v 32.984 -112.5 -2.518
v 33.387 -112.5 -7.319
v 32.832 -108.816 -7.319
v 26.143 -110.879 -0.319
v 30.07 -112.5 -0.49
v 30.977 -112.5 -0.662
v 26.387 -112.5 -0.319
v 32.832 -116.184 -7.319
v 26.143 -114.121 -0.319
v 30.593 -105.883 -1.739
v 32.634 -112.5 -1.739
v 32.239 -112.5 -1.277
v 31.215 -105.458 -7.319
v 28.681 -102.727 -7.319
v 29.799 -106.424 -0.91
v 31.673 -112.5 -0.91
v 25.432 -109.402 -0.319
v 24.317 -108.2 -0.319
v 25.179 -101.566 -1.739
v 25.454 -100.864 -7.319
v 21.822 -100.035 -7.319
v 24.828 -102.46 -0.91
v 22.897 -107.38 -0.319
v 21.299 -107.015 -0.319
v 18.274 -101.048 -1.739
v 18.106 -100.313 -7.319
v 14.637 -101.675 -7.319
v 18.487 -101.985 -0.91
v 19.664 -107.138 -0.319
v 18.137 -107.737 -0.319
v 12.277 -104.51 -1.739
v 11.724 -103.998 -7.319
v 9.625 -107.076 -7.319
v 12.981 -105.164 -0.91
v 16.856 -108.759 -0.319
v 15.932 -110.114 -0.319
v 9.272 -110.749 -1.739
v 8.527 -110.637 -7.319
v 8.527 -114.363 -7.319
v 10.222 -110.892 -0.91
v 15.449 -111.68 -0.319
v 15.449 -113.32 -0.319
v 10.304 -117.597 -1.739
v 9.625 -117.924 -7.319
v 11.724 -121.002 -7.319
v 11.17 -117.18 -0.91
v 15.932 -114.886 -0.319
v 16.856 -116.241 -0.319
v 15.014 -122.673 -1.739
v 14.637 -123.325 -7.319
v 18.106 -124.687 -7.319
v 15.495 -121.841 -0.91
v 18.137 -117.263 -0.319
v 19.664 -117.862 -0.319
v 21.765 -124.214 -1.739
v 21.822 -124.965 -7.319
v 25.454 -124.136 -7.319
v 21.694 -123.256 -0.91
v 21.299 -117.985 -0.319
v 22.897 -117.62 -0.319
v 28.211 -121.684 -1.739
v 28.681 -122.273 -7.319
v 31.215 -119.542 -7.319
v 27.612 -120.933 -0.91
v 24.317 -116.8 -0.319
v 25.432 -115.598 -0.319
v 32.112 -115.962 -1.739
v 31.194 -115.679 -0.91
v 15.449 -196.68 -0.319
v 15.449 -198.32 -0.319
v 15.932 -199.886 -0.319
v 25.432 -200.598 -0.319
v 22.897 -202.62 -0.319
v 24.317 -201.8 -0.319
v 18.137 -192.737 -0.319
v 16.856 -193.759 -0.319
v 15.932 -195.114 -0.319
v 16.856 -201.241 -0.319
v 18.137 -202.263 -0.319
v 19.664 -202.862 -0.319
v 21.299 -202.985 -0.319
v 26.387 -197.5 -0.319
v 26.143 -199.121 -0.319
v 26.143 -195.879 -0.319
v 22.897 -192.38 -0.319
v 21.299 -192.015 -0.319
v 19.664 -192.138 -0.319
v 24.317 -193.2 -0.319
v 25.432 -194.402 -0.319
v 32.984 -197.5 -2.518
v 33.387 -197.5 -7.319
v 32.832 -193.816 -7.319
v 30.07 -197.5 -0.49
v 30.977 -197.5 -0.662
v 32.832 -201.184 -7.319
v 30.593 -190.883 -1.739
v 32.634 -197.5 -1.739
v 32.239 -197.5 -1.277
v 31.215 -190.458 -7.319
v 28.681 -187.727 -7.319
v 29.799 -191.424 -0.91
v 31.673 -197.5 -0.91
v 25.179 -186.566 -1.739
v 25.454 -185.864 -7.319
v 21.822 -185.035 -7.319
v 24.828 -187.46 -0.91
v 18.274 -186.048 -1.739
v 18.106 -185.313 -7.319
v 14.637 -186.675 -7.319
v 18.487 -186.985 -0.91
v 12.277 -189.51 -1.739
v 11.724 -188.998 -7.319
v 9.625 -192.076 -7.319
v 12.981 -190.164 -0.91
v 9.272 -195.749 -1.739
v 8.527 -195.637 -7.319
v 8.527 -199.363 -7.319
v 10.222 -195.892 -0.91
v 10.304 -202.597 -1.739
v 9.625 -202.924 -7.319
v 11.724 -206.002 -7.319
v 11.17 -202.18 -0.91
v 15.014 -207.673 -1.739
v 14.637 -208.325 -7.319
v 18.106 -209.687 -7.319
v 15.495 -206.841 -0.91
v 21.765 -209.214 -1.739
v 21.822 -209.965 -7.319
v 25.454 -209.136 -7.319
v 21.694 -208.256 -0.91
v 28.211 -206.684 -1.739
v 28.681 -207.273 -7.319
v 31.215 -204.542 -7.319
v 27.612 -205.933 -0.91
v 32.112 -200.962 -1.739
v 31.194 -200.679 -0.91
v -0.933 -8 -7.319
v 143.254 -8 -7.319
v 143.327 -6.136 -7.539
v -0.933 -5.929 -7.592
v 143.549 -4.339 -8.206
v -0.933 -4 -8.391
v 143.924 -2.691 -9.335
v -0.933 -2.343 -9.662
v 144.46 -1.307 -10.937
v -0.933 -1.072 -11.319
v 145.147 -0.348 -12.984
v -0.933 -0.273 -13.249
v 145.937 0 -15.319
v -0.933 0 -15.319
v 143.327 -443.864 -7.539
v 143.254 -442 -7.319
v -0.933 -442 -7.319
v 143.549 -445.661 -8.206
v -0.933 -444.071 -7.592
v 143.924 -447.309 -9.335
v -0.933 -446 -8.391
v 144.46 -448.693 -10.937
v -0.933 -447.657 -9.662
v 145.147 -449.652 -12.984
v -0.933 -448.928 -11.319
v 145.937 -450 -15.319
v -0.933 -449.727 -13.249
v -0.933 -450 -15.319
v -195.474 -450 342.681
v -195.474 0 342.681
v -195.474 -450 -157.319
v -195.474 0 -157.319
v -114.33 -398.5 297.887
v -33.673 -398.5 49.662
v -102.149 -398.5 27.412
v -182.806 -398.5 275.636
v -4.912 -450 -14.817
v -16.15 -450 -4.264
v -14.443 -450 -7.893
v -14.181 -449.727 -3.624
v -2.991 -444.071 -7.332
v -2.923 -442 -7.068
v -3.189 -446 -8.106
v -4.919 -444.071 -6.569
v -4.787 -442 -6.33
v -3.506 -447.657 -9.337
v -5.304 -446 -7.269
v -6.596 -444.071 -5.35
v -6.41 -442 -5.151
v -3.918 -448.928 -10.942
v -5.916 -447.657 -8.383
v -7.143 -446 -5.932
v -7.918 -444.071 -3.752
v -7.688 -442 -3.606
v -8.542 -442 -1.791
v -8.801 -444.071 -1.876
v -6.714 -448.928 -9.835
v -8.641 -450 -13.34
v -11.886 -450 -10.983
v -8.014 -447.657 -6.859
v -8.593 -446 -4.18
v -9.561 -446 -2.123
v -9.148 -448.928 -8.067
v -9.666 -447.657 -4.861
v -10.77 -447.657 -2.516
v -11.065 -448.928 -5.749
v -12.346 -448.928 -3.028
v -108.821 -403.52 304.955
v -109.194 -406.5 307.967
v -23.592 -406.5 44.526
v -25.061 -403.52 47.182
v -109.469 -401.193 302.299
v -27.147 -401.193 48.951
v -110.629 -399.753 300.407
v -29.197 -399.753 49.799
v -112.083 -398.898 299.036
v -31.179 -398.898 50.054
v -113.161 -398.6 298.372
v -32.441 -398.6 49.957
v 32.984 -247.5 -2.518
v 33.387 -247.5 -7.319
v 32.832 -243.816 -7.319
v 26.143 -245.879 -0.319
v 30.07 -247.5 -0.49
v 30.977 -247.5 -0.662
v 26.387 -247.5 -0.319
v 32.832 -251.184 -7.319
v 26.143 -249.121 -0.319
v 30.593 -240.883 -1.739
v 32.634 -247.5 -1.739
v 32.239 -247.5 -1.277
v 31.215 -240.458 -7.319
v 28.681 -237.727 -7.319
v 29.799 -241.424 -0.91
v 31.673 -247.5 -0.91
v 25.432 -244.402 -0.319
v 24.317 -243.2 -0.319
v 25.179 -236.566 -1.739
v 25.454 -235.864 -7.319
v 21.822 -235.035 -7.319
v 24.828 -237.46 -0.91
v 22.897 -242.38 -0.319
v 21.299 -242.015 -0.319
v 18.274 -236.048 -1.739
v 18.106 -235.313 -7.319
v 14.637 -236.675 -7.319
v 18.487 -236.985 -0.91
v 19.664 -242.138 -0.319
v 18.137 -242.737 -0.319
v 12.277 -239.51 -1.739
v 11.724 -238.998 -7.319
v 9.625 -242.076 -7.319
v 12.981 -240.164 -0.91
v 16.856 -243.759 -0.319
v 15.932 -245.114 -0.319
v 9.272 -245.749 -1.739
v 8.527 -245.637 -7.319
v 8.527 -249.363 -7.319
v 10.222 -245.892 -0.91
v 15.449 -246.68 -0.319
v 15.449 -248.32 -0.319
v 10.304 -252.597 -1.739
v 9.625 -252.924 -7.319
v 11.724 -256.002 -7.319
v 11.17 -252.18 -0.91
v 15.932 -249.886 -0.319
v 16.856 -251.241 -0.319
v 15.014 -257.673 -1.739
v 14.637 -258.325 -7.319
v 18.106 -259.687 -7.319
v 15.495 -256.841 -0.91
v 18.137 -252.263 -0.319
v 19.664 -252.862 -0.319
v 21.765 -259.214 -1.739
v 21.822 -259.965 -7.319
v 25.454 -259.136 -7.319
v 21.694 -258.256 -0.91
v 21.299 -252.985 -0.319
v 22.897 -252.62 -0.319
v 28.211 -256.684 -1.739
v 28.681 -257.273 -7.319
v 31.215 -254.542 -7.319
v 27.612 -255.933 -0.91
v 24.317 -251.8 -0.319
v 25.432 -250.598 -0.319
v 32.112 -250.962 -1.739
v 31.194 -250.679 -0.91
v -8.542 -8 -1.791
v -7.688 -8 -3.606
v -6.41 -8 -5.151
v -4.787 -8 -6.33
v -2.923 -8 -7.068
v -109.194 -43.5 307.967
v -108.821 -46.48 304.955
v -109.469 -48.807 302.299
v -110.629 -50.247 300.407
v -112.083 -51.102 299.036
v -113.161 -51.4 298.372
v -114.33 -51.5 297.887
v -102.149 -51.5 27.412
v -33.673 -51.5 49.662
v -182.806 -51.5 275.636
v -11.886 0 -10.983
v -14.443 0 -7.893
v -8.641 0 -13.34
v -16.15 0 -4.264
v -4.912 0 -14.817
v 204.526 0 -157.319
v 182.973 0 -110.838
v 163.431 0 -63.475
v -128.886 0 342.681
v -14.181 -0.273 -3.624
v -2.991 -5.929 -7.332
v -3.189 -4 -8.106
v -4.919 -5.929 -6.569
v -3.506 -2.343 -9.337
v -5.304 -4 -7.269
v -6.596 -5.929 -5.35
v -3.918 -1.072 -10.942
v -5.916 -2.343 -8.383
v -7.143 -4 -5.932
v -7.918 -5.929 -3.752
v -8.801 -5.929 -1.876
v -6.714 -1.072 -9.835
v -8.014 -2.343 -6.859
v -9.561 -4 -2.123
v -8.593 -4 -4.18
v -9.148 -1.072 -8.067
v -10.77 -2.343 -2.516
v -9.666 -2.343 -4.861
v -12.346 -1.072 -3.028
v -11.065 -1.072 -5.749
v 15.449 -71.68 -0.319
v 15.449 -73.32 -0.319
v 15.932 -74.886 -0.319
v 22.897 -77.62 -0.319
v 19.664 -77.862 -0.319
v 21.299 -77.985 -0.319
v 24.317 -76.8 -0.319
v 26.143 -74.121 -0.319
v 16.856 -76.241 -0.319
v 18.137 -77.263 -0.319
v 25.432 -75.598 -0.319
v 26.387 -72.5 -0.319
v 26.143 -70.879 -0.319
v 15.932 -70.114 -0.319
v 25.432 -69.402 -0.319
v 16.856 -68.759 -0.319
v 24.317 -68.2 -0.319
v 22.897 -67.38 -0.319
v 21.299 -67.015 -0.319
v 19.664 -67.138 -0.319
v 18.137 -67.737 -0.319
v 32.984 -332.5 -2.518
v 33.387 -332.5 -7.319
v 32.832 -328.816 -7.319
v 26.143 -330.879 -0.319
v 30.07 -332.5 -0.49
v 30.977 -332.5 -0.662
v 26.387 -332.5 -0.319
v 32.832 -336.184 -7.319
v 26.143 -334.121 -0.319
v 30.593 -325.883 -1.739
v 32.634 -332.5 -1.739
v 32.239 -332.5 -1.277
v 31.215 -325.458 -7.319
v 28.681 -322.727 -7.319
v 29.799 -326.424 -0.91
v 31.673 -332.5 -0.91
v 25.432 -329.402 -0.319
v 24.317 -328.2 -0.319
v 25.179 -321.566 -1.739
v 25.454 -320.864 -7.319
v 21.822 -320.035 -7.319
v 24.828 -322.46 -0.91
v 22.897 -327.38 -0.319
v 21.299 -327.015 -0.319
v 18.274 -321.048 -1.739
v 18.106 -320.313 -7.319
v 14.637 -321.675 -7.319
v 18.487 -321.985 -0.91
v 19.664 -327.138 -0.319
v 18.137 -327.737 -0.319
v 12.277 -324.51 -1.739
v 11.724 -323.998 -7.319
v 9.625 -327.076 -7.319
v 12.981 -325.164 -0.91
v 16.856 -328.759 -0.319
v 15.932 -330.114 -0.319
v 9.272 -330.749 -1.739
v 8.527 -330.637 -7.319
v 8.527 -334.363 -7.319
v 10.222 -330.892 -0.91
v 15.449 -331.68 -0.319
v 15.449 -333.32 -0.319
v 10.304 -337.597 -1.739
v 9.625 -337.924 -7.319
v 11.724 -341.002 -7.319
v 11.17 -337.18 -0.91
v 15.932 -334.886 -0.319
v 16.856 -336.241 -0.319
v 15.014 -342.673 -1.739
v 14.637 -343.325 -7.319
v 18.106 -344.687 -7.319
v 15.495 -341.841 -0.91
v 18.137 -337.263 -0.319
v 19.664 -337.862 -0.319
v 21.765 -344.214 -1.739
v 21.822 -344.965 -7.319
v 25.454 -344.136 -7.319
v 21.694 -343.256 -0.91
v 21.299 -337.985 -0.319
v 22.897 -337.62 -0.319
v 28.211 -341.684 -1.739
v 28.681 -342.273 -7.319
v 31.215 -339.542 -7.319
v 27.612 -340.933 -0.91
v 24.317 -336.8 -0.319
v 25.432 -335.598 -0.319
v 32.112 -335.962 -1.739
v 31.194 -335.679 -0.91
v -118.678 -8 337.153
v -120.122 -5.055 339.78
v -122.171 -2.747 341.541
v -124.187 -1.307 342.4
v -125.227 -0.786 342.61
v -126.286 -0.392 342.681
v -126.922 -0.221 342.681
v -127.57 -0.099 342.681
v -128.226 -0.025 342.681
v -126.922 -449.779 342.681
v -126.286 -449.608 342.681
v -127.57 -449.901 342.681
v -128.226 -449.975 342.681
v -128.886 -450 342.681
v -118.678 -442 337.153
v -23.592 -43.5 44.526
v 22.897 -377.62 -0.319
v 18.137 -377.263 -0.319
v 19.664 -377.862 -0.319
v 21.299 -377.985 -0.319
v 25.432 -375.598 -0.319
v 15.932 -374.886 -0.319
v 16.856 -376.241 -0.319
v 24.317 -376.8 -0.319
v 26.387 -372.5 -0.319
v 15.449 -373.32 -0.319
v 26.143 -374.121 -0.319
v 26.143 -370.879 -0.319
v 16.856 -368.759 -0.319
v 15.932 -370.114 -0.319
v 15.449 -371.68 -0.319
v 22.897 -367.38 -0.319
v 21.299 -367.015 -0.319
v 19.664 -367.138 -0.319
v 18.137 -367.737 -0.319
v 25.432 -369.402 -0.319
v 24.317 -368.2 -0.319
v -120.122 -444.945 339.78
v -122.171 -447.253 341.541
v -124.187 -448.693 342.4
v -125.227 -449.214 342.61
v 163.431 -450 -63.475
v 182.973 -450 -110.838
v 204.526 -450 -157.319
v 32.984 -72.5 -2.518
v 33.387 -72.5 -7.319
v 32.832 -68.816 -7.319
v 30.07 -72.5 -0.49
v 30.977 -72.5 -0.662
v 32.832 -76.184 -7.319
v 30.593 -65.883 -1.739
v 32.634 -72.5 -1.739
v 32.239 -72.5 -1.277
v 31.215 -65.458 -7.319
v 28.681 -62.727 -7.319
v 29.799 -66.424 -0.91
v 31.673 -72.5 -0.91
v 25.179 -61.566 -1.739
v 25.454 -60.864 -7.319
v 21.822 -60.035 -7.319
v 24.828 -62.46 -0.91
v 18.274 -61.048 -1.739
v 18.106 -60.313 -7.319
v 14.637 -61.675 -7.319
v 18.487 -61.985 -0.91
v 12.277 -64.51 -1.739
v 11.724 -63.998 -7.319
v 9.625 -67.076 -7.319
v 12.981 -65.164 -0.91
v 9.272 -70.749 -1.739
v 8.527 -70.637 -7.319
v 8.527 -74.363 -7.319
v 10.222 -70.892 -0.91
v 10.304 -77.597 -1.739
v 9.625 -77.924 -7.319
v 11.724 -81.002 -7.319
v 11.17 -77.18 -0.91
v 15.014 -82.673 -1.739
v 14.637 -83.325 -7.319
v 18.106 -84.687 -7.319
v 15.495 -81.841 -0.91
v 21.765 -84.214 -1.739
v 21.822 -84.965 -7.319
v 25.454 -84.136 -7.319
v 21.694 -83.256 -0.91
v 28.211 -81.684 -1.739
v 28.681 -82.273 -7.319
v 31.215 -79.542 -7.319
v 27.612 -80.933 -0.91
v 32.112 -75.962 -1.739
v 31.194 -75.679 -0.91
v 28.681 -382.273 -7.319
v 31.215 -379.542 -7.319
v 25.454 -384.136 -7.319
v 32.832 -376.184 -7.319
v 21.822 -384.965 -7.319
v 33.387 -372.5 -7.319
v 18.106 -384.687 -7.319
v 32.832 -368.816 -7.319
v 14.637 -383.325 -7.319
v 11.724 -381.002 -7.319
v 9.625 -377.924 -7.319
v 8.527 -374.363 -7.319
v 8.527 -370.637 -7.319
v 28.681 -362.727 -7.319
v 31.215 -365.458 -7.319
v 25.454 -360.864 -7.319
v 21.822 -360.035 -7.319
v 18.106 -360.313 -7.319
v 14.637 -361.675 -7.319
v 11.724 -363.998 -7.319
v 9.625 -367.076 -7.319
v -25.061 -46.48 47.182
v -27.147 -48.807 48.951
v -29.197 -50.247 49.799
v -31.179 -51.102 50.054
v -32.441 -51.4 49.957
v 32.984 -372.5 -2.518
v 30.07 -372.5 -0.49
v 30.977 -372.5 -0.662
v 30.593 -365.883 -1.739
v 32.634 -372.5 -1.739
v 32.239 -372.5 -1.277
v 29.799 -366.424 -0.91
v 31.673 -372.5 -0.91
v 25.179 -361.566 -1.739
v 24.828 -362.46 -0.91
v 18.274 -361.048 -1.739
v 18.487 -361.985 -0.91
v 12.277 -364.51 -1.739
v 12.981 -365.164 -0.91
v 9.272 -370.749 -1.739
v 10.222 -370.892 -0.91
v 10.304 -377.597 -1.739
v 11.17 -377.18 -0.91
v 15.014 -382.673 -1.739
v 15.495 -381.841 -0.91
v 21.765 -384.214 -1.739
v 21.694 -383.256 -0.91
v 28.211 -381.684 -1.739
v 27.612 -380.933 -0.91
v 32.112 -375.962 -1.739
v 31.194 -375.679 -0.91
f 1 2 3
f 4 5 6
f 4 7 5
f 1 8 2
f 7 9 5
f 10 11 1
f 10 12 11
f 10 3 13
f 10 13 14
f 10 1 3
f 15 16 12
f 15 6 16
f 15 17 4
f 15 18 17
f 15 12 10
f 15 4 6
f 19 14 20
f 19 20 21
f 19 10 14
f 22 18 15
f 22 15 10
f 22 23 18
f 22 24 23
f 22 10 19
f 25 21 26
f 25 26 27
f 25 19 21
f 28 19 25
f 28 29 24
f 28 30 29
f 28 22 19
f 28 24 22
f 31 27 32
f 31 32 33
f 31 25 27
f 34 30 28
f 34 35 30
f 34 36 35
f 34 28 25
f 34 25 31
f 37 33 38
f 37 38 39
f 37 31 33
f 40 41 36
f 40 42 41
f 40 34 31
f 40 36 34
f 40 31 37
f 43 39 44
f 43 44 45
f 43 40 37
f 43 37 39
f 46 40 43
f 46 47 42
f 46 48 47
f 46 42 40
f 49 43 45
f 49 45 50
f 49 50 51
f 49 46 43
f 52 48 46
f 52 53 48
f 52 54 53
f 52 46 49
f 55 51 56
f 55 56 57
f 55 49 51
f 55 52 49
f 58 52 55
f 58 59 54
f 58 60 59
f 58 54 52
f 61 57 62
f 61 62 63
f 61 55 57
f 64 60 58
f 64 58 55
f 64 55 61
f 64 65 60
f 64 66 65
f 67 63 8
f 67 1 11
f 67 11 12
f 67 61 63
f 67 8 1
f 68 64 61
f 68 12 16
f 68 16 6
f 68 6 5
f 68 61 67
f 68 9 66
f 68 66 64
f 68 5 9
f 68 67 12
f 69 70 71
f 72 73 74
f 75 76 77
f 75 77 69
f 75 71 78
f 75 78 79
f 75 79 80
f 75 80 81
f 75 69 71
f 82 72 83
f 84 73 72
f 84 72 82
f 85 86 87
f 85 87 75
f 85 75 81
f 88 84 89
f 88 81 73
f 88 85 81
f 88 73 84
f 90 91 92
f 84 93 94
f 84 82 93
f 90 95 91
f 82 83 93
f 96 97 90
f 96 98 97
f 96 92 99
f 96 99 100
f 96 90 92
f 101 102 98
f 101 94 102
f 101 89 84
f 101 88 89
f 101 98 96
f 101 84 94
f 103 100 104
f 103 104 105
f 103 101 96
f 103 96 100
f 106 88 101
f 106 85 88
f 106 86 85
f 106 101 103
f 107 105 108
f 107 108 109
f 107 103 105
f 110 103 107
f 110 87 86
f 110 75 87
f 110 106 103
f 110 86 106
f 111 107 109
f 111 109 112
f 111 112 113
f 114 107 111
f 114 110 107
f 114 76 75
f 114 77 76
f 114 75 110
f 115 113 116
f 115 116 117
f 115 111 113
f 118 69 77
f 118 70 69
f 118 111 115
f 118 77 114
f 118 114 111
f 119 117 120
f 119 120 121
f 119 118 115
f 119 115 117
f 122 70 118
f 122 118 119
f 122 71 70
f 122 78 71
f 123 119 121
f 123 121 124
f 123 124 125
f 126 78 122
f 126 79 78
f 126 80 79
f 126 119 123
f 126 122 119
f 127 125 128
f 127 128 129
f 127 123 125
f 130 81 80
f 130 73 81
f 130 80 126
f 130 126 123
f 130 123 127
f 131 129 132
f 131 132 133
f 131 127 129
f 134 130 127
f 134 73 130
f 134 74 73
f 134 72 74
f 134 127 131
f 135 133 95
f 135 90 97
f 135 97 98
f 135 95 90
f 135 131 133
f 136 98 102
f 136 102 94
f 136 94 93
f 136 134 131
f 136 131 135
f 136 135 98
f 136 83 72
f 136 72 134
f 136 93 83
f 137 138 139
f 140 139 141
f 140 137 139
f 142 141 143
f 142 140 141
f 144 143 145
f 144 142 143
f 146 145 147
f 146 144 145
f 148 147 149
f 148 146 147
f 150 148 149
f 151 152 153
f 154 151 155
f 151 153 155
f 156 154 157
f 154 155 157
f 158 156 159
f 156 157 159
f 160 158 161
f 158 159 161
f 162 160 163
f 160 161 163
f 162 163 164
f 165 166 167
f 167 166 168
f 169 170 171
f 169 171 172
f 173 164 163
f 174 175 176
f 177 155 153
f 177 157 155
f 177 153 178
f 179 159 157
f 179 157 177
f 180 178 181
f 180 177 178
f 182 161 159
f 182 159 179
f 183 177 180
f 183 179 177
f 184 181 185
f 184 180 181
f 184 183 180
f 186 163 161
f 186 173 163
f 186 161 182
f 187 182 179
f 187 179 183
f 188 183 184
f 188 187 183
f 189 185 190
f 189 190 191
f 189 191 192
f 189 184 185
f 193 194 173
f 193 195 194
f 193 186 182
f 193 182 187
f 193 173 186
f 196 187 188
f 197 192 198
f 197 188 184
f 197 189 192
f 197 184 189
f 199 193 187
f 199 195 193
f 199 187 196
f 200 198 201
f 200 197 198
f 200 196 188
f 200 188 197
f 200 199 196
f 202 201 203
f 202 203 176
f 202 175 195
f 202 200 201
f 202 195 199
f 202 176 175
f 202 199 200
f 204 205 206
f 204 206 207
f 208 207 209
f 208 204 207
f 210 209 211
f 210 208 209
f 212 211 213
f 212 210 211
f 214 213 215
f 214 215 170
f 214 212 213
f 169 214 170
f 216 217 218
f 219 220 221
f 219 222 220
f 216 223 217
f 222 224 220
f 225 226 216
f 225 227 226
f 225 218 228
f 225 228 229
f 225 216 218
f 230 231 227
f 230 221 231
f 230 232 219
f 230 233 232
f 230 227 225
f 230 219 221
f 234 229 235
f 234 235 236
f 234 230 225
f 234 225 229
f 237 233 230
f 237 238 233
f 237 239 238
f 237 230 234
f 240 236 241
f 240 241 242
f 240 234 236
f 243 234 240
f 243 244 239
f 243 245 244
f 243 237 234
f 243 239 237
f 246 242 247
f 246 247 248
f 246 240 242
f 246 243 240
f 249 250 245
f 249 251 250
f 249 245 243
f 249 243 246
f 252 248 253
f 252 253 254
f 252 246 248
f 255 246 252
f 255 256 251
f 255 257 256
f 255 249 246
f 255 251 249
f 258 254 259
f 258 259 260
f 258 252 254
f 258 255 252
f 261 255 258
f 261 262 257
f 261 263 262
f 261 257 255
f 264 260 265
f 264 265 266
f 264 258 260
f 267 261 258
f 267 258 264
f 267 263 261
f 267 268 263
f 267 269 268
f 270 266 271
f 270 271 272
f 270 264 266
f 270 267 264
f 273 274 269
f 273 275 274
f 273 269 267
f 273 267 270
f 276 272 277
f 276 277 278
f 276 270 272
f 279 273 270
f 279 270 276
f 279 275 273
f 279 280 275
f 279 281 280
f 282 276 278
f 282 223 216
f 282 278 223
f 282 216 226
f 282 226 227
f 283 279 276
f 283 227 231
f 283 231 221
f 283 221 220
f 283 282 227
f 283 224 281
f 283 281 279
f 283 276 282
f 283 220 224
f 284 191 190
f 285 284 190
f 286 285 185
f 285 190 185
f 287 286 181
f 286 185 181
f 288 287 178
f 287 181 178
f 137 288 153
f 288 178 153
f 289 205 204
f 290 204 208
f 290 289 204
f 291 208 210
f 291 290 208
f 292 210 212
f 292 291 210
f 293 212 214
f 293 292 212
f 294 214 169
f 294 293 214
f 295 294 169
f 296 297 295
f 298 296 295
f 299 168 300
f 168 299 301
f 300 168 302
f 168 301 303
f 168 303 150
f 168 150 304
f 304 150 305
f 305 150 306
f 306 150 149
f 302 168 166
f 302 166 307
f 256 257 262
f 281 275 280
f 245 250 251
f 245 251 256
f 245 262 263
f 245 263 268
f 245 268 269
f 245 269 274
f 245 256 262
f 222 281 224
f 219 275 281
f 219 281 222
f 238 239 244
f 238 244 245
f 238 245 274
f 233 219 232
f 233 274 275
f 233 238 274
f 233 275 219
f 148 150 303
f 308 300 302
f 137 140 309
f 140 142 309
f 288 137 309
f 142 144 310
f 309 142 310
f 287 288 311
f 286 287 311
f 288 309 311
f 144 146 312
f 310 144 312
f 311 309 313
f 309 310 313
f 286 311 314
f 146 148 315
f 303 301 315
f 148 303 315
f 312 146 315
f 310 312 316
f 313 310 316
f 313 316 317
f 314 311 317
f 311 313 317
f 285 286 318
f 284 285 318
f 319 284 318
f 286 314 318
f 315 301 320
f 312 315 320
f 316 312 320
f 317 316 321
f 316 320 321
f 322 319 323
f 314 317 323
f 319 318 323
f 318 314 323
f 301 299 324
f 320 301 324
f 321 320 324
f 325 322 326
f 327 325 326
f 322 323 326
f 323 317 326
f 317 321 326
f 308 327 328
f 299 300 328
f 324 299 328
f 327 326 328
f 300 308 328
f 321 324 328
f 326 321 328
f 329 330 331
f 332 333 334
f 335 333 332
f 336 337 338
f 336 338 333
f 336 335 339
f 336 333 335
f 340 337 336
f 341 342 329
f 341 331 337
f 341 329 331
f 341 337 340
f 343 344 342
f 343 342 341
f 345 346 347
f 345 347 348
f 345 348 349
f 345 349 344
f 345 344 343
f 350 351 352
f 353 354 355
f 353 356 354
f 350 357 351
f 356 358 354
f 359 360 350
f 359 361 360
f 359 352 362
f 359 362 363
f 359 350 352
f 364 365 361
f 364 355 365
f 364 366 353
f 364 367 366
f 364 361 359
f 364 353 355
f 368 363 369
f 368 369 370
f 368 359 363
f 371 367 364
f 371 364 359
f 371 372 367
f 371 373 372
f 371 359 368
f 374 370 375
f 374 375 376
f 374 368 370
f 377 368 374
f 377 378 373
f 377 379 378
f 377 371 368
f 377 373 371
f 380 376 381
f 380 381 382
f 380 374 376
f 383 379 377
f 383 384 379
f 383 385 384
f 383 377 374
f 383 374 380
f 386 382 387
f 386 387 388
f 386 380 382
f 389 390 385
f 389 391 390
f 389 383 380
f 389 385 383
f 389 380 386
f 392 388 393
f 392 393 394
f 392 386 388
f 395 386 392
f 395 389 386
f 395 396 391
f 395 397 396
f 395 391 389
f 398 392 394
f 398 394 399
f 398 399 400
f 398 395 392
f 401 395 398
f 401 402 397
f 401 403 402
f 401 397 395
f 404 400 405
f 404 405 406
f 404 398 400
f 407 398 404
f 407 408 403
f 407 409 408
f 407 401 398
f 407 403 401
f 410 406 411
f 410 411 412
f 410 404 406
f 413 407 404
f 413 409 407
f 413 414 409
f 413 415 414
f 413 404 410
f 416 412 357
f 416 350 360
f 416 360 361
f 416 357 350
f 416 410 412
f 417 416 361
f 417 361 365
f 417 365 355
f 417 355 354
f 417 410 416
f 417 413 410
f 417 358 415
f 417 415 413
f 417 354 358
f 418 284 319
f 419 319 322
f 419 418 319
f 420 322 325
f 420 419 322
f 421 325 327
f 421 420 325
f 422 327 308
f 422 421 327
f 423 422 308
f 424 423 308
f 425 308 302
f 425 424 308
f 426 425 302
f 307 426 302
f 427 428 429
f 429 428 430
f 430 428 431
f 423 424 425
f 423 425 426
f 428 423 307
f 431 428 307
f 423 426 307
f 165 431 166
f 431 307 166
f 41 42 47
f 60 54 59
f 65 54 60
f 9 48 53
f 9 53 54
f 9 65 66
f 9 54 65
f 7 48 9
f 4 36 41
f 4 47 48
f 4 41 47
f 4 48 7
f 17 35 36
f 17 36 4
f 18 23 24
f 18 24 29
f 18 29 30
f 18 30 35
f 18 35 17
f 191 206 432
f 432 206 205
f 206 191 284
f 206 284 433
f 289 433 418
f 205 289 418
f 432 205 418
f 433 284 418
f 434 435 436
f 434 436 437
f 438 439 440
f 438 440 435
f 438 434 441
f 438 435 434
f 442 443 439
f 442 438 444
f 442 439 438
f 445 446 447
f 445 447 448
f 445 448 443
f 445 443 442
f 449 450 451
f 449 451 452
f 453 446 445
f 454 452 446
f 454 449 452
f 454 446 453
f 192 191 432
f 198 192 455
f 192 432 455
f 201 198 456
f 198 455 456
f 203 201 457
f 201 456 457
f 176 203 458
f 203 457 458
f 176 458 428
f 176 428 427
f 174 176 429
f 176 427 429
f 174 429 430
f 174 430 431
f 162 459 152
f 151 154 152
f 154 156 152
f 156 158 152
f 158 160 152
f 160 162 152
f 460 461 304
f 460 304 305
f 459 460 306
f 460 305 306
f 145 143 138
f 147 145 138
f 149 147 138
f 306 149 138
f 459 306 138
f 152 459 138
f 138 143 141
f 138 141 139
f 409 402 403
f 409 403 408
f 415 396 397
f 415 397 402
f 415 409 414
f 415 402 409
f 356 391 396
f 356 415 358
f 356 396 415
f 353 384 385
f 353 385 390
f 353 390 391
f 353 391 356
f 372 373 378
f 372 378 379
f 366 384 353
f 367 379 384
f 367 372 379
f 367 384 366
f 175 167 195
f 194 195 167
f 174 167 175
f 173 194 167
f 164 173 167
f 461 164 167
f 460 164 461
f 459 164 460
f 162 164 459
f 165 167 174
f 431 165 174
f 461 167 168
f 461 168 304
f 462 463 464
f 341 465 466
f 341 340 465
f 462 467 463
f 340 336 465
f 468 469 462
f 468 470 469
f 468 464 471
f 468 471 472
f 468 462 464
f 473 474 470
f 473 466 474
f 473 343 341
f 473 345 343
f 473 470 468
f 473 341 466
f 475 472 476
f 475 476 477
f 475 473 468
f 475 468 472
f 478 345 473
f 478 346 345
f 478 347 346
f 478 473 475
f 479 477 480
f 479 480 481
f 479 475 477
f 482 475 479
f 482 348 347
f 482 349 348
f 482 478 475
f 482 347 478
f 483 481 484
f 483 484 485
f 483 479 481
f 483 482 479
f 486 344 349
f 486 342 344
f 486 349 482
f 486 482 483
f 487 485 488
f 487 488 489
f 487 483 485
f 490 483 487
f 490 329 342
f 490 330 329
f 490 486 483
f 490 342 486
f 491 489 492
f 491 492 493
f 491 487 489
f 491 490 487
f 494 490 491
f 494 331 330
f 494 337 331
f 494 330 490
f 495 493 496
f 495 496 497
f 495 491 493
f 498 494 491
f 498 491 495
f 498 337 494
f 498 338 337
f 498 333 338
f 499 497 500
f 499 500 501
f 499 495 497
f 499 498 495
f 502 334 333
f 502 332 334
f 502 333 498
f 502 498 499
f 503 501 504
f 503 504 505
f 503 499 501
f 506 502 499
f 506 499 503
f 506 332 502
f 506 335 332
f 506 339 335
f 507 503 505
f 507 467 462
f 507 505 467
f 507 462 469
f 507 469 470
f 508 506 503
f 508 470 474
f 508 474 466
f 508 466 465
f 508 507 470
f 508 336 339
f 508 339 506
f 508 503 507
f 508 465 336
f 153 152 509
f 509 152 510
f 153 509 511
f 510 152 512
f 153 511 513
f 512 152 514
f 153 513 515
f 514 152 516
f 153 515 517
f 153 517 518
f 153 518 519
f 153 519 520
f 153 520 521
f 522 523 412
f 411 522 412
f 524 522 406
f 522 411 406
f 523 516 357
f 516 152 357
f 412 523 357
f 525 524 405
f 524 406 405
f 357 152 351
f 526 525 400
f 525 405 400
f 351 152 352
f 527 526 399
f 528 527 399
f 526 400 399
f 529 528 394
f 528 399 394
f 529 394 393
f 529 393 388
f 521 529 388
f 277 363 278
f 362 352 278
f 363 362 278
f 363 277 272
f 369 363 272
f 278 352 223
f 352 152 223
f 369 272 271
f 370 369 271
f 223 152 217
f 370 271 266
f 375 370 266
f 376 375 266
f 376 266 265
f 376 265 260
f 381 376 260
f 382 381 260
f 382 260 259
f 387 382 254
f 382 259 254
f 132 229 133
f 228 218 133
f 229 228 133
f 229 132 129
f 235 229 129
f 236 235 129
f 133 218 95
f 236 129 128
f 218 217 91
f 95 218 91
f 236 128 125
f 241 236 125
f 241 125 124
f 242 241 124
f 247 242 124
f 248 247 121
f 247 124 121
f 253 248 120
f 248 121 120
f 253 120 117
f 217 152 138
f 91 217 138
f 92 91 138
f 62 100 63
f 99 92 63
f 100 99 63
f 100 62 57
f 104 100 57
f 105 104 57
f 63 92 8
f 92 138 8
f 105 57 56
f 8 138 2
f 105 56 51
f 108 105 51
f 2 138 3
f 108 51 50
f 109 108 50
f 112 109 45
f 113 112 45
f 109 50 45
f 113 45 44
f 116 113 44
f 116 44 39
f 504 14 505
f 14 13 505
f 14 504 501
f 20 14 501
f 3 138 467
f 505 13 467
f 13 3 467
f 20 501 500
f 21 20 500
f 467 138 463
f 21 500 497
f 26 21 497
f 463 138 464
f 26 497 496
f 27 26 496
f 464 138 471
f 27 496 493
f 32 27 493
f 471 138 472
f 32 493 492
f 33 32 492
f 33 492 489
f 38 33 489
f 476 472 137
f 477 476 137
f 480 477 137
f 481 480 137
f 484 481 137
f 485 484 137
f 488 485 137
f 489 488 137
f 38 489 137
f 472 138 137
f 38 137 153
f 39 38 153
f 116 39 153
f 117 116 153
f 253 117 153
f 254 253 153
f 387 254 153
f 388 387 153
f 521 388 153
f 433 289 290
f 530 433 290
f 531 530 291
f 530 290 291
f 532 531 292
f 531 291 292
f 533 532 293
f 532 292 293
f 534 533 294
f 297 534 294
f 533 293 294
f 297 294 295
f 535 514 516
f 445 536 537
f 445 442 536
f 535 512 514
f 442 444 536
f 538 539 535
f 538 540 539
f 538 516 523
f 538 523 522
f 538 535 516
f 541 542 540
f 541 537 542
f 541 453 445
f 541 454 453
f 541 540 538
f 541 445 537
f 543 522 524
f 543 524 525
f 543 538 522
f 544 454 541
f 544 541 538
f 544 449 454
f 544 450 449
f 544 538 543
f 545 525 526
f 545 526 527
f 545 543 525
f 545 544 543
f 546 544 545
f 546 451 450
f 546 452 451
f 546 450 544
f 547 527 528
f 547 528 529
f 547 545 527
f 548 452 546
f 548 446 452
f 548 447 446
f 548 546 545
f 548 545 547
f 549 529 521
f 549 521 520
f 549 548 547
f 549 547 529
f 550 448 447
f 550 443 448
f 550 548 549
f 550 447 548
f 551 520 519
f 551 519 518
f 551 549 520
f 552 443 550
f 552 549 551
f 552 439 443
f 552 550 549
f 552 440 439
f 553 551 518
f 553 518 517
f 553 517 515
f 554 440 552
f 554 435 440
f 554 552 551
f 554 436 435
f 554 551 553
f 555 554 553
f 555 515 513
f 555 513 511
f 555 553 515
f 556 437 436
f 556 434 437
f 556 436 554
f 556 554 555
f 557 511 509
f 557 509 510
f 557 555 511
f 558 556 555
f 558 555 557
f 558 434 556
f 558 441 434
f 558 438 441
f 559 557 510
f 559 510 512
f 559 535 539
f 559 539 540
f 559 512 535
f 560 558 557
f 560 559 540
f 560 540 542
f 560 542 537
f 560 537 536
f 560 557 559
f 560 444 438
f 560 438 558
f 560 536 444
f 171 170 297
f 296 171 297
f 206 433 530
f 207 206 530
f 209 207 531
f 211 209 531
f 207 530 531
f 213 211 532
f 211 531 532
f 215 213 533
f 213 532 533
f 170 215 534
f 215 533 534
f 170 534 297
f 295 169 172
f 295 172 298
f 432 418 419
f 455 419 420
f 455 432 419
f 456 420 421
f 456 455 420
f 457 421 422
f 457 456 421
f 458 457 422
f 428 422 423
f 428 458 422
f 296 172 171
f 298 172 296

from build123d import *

# Parameters (mm, degrees)
F1_DEPTH = 450
F2_W     = 347
F2_H     = 261
F3_DEPTH = 80
F4_F1_R  = 8
F4_F2_R  = 8
F5_R     = 12.5
F6_DEPTH = 7


# Not quite as in the source:
# - a fillet or chamfer that OpenCascade refuses, or shapes differently, is made with other operations: its cross-section is extruded or revolved along the edge and cut away or added


with BuildPart() as f1:
    # F0 (on Front) → F1 (new body)
    with BuildSketch(Plane.XZ):
        with BuildLine():
            Line((-120.4737946391, 342.6808416843), (-195.4737946391, 342.6808416843))
            Line((-195.4737946391, 342.6808416843), (-195.4737946391, -157.3191583157))
            Line((-195.4737946391, -157.3191583157), (204.5262053609, -157.3191583157))
            ThreePointArc((204.5262053609, -157.3191583157), (171.3461744918, -83.3583725961), (143.2543578127, -7.3191583157))
            Line((143.2543578127, -7.3191583157), (-6.7456421873, -7.3191583157))
            Line((-6.7456421873, -7.3191583157), (-120.4737946391, 342.6808416843))
        make_face()
    extrude(amount=F1_DEPTH)

    # F2 (on face) → F3 (cut)
    with BuildSketch(Plane(origin=(-8.2525689762, 0, -2.681569779), x_dir=(0, 1, 0), z_dir=(0.951051518, 0, 0.3090323772))):
        with Locations((-225, 188.1374378125)):
            Rectangle(F2_W, F2_H)
    extrude(amount=-F3_DEPTH, mode=Mode.SUBTRACT)

    # F4: fillet of radius 8 on 8 edges, made by hand

    # F4_f1
    f4_f1_edges = [f1.edges().sort_by_distance(p)[0] for p in [
        (-6.7456421873, -225, -7.3191583157),
    ]]
    fillet(f4_f1_edges, radius=F4_F1_R)

    # F4_f2
    f4_f2_edges = [f1.edges().sort_by_distance(p)[0] for p in [
        (-64.5078037977, 0, 170.4447121755),
        (-64.5078037977, -450, 170.4447121755),
        (-120.4737946391, -225, 342.6808416843),
        (-66.3931286265, -398.5, 176.2468260396),
        (-106.7218538531, -225, 300.3590491347),
        (-66.3931286265, -51.5, 176.2468260396),
        (-26.0644034, -225, 52.1346029445),
        (-5.6356304889, -450, -5.791332299),
        (-5.6356304889, 0, -5.791332299),
    ]]
    fillet(f4_f2_edges, radius=F4_F2_R)

    # F5 (on face) → F6 (join)
    with BuildSketch(Plane.XY.offset(-7.3191583157)):
        with Locations((20.8874940872, -372.5)):
            Circle(F5_R)
        with Locations((20.8874940872, -332.5)):
            Circle(F5_R)
        with Locations((20.8874940872, -247.5)):
            Circle(F5_R)
        with Locations((20.8874940872, -197.5)):
            Circle(F5_R)
        with Locations((20.8874940872, -112.5)):
            Circle(F5_R)
        with Locations((20.8874940872, -72.5)):
            Circle(F5_R)
    extrude(amount=F6_DEPTH)

    # F7: fillet of radius 7 on 1 edges, made by hand

    # F7_s1 → F7_t2 (revolve, cut)
    with BuildSketch(Plane.XZ.offset(372.5)):
        with BuildLine():
            add(Edge.make_bspline(
                [(33.3874940872, -7.3191583157), (33.3874940872, -0.3191583157), (26.3874940872, -0.3191583157)],
                knots=[0, 0, 0, 1, 1, 1], degree=2, weights=[1, 2.3333333333, 1]))
            Line((26.3874940872, -0.3191583157), (33.3874940872, -0.3191583157))
            Line((33.3874940872, -0.3191583157), (33.3874940872, -7.3191583157))
        make_face()
    revolve(axis=Axis((20.8874940872, -372.5, -0.3191583157), (0, 0, 1)), mode=Mode.SUBTRACT)

    # F8: fillet of radius 7 on 5 edges, made by hand

    # F8_s1 → F8_t2 (revolve, cut)
    with BuildSketch(Plane.XZ.offset(332.5)):
        with BuildLine():
            add(Edge.make_bspline(
                [(33.3874940872, -7.3191583157), (33.3874940872, -0.3191583157), (26.3874940872, -0.3191583157)],
                knots=[0, 0, 0, 1, 1, 1], degree=2, weights=[1, 2.3333333333, 1]))
            Line((26.3874940872, -0.3191583157), (33.3874940872, -0.3191583157))
            Line((33.3874940872, -0.3191583157), (33.3874940872, -7.3191583157))
        make_face()
    revolve(axis=Axis((20.8874940872, -332.5, -0.3191583157), (0, 0, 1)), mode=Mode.SUBTRACT)

    # F8_s3 → F8_t4 (revolve, cut)
    with BuildSketch(Plane.XZ.offset(197.5)):
        with BuildLine():
            add(Edge.make_bspline(
                [(33.3874940872, -7.3191583157), (33.3874940872, -0.3191583157), (26.3874940872, -0.3191583157)],
                knots=[0, 0, 0, 1, 1, 1], degree=2, weights=[1, 2.3333333333, 1]))
            Line((26.3874940872, -0.3191583157), (33.3874940872, -0.3191583157))
            Line((33.3874940872, -0.3191583157), (33.3874940872, -7.3191583157))
        make_face()
    revolve(axis=Axis((20.8874940872, -197.5, -0.3191583157), (0, 0, 1)), mode=Mode.SUBTRACT)

    # F8_s5 → F8_t6 (revolve, cut)
    with BuildSketch(Plane.XZ.offset(247.5)):
        with BuildLine():
            add(Edge.make_bspline(
                [(33.3874940872, -7.3191583157), (33.3874940872, -0.3191583157), (26.3874940872, -0.3191583157)],
                knots=[0, 0, 0, 1, 1, 1], degree=2, weights=[1, 2.3333333333, 1]))
            Line((26.3874940872, -0.3191583157), (33.3874940872, -0.3191583157))
            Line((33.3874940872, -0.3191583157), (33.3874940872, -7.3191583157))
        make_face()
    revolve(axis=Axis((20.8874940872, -247.5, -0.3191583157), (0, 0, 1)), mode=Mode.SUBTRACT)

    # F8_s7 → F8_t8 (revolve, cut)
    with BuildSketch(Plane.XZ.offset(112.5)):
        with BuildLine():
            add(Edge.make_bspline(
                [(33.3874940872, -7.3191583157), (33.3874940872, -0.3191583157), (26.3874940872, -0.3191583157)],
                knots=[0, 0, 0, 1, 1, 1], degree=2, weights=[1, 2.3333333333, 1]))
            Line((26.3874940872, -0.3191583157), (33.3874940872, -0.3191583157))
            Line((33.3874940872, -0.3191583157), (33.3874940872, -7.3191583157))
        make_face()
    revolve(axis=Axis((20.8874940872, -112.5, -0.3191583157), (0, 0, 1)), mode=Mode.SUBTRACT)

    # F8_s9 → F8_t10 (revolve, cut)
    with BuildSketch(Plane.XZ.offset(72.5)):
        with BuildLine():
            add(Edge.make_bspline(
                [(33.3874940872, -7.3191583157), (33.3874940872, -0.3191583157), (26.3874940872, -0.3191583157)],
                knots=[0, 0, 0, 1, 1, 1], degree=2, weights=[1, 2.3333333333, 1]))
            Line((26.3874940872, -0.3191583157), (33.3874940872, -0.3191583157))
            Line((33.3874940872, -0.3191583157), (33.3874940872, -7.3191583157))
        make_face()
    revolve(axis=Axis((20.8874940872, -72.5, -0.3191583157), (0, 0, 1)), mode=Mode.SUBTRACT)


solid = f1.part
